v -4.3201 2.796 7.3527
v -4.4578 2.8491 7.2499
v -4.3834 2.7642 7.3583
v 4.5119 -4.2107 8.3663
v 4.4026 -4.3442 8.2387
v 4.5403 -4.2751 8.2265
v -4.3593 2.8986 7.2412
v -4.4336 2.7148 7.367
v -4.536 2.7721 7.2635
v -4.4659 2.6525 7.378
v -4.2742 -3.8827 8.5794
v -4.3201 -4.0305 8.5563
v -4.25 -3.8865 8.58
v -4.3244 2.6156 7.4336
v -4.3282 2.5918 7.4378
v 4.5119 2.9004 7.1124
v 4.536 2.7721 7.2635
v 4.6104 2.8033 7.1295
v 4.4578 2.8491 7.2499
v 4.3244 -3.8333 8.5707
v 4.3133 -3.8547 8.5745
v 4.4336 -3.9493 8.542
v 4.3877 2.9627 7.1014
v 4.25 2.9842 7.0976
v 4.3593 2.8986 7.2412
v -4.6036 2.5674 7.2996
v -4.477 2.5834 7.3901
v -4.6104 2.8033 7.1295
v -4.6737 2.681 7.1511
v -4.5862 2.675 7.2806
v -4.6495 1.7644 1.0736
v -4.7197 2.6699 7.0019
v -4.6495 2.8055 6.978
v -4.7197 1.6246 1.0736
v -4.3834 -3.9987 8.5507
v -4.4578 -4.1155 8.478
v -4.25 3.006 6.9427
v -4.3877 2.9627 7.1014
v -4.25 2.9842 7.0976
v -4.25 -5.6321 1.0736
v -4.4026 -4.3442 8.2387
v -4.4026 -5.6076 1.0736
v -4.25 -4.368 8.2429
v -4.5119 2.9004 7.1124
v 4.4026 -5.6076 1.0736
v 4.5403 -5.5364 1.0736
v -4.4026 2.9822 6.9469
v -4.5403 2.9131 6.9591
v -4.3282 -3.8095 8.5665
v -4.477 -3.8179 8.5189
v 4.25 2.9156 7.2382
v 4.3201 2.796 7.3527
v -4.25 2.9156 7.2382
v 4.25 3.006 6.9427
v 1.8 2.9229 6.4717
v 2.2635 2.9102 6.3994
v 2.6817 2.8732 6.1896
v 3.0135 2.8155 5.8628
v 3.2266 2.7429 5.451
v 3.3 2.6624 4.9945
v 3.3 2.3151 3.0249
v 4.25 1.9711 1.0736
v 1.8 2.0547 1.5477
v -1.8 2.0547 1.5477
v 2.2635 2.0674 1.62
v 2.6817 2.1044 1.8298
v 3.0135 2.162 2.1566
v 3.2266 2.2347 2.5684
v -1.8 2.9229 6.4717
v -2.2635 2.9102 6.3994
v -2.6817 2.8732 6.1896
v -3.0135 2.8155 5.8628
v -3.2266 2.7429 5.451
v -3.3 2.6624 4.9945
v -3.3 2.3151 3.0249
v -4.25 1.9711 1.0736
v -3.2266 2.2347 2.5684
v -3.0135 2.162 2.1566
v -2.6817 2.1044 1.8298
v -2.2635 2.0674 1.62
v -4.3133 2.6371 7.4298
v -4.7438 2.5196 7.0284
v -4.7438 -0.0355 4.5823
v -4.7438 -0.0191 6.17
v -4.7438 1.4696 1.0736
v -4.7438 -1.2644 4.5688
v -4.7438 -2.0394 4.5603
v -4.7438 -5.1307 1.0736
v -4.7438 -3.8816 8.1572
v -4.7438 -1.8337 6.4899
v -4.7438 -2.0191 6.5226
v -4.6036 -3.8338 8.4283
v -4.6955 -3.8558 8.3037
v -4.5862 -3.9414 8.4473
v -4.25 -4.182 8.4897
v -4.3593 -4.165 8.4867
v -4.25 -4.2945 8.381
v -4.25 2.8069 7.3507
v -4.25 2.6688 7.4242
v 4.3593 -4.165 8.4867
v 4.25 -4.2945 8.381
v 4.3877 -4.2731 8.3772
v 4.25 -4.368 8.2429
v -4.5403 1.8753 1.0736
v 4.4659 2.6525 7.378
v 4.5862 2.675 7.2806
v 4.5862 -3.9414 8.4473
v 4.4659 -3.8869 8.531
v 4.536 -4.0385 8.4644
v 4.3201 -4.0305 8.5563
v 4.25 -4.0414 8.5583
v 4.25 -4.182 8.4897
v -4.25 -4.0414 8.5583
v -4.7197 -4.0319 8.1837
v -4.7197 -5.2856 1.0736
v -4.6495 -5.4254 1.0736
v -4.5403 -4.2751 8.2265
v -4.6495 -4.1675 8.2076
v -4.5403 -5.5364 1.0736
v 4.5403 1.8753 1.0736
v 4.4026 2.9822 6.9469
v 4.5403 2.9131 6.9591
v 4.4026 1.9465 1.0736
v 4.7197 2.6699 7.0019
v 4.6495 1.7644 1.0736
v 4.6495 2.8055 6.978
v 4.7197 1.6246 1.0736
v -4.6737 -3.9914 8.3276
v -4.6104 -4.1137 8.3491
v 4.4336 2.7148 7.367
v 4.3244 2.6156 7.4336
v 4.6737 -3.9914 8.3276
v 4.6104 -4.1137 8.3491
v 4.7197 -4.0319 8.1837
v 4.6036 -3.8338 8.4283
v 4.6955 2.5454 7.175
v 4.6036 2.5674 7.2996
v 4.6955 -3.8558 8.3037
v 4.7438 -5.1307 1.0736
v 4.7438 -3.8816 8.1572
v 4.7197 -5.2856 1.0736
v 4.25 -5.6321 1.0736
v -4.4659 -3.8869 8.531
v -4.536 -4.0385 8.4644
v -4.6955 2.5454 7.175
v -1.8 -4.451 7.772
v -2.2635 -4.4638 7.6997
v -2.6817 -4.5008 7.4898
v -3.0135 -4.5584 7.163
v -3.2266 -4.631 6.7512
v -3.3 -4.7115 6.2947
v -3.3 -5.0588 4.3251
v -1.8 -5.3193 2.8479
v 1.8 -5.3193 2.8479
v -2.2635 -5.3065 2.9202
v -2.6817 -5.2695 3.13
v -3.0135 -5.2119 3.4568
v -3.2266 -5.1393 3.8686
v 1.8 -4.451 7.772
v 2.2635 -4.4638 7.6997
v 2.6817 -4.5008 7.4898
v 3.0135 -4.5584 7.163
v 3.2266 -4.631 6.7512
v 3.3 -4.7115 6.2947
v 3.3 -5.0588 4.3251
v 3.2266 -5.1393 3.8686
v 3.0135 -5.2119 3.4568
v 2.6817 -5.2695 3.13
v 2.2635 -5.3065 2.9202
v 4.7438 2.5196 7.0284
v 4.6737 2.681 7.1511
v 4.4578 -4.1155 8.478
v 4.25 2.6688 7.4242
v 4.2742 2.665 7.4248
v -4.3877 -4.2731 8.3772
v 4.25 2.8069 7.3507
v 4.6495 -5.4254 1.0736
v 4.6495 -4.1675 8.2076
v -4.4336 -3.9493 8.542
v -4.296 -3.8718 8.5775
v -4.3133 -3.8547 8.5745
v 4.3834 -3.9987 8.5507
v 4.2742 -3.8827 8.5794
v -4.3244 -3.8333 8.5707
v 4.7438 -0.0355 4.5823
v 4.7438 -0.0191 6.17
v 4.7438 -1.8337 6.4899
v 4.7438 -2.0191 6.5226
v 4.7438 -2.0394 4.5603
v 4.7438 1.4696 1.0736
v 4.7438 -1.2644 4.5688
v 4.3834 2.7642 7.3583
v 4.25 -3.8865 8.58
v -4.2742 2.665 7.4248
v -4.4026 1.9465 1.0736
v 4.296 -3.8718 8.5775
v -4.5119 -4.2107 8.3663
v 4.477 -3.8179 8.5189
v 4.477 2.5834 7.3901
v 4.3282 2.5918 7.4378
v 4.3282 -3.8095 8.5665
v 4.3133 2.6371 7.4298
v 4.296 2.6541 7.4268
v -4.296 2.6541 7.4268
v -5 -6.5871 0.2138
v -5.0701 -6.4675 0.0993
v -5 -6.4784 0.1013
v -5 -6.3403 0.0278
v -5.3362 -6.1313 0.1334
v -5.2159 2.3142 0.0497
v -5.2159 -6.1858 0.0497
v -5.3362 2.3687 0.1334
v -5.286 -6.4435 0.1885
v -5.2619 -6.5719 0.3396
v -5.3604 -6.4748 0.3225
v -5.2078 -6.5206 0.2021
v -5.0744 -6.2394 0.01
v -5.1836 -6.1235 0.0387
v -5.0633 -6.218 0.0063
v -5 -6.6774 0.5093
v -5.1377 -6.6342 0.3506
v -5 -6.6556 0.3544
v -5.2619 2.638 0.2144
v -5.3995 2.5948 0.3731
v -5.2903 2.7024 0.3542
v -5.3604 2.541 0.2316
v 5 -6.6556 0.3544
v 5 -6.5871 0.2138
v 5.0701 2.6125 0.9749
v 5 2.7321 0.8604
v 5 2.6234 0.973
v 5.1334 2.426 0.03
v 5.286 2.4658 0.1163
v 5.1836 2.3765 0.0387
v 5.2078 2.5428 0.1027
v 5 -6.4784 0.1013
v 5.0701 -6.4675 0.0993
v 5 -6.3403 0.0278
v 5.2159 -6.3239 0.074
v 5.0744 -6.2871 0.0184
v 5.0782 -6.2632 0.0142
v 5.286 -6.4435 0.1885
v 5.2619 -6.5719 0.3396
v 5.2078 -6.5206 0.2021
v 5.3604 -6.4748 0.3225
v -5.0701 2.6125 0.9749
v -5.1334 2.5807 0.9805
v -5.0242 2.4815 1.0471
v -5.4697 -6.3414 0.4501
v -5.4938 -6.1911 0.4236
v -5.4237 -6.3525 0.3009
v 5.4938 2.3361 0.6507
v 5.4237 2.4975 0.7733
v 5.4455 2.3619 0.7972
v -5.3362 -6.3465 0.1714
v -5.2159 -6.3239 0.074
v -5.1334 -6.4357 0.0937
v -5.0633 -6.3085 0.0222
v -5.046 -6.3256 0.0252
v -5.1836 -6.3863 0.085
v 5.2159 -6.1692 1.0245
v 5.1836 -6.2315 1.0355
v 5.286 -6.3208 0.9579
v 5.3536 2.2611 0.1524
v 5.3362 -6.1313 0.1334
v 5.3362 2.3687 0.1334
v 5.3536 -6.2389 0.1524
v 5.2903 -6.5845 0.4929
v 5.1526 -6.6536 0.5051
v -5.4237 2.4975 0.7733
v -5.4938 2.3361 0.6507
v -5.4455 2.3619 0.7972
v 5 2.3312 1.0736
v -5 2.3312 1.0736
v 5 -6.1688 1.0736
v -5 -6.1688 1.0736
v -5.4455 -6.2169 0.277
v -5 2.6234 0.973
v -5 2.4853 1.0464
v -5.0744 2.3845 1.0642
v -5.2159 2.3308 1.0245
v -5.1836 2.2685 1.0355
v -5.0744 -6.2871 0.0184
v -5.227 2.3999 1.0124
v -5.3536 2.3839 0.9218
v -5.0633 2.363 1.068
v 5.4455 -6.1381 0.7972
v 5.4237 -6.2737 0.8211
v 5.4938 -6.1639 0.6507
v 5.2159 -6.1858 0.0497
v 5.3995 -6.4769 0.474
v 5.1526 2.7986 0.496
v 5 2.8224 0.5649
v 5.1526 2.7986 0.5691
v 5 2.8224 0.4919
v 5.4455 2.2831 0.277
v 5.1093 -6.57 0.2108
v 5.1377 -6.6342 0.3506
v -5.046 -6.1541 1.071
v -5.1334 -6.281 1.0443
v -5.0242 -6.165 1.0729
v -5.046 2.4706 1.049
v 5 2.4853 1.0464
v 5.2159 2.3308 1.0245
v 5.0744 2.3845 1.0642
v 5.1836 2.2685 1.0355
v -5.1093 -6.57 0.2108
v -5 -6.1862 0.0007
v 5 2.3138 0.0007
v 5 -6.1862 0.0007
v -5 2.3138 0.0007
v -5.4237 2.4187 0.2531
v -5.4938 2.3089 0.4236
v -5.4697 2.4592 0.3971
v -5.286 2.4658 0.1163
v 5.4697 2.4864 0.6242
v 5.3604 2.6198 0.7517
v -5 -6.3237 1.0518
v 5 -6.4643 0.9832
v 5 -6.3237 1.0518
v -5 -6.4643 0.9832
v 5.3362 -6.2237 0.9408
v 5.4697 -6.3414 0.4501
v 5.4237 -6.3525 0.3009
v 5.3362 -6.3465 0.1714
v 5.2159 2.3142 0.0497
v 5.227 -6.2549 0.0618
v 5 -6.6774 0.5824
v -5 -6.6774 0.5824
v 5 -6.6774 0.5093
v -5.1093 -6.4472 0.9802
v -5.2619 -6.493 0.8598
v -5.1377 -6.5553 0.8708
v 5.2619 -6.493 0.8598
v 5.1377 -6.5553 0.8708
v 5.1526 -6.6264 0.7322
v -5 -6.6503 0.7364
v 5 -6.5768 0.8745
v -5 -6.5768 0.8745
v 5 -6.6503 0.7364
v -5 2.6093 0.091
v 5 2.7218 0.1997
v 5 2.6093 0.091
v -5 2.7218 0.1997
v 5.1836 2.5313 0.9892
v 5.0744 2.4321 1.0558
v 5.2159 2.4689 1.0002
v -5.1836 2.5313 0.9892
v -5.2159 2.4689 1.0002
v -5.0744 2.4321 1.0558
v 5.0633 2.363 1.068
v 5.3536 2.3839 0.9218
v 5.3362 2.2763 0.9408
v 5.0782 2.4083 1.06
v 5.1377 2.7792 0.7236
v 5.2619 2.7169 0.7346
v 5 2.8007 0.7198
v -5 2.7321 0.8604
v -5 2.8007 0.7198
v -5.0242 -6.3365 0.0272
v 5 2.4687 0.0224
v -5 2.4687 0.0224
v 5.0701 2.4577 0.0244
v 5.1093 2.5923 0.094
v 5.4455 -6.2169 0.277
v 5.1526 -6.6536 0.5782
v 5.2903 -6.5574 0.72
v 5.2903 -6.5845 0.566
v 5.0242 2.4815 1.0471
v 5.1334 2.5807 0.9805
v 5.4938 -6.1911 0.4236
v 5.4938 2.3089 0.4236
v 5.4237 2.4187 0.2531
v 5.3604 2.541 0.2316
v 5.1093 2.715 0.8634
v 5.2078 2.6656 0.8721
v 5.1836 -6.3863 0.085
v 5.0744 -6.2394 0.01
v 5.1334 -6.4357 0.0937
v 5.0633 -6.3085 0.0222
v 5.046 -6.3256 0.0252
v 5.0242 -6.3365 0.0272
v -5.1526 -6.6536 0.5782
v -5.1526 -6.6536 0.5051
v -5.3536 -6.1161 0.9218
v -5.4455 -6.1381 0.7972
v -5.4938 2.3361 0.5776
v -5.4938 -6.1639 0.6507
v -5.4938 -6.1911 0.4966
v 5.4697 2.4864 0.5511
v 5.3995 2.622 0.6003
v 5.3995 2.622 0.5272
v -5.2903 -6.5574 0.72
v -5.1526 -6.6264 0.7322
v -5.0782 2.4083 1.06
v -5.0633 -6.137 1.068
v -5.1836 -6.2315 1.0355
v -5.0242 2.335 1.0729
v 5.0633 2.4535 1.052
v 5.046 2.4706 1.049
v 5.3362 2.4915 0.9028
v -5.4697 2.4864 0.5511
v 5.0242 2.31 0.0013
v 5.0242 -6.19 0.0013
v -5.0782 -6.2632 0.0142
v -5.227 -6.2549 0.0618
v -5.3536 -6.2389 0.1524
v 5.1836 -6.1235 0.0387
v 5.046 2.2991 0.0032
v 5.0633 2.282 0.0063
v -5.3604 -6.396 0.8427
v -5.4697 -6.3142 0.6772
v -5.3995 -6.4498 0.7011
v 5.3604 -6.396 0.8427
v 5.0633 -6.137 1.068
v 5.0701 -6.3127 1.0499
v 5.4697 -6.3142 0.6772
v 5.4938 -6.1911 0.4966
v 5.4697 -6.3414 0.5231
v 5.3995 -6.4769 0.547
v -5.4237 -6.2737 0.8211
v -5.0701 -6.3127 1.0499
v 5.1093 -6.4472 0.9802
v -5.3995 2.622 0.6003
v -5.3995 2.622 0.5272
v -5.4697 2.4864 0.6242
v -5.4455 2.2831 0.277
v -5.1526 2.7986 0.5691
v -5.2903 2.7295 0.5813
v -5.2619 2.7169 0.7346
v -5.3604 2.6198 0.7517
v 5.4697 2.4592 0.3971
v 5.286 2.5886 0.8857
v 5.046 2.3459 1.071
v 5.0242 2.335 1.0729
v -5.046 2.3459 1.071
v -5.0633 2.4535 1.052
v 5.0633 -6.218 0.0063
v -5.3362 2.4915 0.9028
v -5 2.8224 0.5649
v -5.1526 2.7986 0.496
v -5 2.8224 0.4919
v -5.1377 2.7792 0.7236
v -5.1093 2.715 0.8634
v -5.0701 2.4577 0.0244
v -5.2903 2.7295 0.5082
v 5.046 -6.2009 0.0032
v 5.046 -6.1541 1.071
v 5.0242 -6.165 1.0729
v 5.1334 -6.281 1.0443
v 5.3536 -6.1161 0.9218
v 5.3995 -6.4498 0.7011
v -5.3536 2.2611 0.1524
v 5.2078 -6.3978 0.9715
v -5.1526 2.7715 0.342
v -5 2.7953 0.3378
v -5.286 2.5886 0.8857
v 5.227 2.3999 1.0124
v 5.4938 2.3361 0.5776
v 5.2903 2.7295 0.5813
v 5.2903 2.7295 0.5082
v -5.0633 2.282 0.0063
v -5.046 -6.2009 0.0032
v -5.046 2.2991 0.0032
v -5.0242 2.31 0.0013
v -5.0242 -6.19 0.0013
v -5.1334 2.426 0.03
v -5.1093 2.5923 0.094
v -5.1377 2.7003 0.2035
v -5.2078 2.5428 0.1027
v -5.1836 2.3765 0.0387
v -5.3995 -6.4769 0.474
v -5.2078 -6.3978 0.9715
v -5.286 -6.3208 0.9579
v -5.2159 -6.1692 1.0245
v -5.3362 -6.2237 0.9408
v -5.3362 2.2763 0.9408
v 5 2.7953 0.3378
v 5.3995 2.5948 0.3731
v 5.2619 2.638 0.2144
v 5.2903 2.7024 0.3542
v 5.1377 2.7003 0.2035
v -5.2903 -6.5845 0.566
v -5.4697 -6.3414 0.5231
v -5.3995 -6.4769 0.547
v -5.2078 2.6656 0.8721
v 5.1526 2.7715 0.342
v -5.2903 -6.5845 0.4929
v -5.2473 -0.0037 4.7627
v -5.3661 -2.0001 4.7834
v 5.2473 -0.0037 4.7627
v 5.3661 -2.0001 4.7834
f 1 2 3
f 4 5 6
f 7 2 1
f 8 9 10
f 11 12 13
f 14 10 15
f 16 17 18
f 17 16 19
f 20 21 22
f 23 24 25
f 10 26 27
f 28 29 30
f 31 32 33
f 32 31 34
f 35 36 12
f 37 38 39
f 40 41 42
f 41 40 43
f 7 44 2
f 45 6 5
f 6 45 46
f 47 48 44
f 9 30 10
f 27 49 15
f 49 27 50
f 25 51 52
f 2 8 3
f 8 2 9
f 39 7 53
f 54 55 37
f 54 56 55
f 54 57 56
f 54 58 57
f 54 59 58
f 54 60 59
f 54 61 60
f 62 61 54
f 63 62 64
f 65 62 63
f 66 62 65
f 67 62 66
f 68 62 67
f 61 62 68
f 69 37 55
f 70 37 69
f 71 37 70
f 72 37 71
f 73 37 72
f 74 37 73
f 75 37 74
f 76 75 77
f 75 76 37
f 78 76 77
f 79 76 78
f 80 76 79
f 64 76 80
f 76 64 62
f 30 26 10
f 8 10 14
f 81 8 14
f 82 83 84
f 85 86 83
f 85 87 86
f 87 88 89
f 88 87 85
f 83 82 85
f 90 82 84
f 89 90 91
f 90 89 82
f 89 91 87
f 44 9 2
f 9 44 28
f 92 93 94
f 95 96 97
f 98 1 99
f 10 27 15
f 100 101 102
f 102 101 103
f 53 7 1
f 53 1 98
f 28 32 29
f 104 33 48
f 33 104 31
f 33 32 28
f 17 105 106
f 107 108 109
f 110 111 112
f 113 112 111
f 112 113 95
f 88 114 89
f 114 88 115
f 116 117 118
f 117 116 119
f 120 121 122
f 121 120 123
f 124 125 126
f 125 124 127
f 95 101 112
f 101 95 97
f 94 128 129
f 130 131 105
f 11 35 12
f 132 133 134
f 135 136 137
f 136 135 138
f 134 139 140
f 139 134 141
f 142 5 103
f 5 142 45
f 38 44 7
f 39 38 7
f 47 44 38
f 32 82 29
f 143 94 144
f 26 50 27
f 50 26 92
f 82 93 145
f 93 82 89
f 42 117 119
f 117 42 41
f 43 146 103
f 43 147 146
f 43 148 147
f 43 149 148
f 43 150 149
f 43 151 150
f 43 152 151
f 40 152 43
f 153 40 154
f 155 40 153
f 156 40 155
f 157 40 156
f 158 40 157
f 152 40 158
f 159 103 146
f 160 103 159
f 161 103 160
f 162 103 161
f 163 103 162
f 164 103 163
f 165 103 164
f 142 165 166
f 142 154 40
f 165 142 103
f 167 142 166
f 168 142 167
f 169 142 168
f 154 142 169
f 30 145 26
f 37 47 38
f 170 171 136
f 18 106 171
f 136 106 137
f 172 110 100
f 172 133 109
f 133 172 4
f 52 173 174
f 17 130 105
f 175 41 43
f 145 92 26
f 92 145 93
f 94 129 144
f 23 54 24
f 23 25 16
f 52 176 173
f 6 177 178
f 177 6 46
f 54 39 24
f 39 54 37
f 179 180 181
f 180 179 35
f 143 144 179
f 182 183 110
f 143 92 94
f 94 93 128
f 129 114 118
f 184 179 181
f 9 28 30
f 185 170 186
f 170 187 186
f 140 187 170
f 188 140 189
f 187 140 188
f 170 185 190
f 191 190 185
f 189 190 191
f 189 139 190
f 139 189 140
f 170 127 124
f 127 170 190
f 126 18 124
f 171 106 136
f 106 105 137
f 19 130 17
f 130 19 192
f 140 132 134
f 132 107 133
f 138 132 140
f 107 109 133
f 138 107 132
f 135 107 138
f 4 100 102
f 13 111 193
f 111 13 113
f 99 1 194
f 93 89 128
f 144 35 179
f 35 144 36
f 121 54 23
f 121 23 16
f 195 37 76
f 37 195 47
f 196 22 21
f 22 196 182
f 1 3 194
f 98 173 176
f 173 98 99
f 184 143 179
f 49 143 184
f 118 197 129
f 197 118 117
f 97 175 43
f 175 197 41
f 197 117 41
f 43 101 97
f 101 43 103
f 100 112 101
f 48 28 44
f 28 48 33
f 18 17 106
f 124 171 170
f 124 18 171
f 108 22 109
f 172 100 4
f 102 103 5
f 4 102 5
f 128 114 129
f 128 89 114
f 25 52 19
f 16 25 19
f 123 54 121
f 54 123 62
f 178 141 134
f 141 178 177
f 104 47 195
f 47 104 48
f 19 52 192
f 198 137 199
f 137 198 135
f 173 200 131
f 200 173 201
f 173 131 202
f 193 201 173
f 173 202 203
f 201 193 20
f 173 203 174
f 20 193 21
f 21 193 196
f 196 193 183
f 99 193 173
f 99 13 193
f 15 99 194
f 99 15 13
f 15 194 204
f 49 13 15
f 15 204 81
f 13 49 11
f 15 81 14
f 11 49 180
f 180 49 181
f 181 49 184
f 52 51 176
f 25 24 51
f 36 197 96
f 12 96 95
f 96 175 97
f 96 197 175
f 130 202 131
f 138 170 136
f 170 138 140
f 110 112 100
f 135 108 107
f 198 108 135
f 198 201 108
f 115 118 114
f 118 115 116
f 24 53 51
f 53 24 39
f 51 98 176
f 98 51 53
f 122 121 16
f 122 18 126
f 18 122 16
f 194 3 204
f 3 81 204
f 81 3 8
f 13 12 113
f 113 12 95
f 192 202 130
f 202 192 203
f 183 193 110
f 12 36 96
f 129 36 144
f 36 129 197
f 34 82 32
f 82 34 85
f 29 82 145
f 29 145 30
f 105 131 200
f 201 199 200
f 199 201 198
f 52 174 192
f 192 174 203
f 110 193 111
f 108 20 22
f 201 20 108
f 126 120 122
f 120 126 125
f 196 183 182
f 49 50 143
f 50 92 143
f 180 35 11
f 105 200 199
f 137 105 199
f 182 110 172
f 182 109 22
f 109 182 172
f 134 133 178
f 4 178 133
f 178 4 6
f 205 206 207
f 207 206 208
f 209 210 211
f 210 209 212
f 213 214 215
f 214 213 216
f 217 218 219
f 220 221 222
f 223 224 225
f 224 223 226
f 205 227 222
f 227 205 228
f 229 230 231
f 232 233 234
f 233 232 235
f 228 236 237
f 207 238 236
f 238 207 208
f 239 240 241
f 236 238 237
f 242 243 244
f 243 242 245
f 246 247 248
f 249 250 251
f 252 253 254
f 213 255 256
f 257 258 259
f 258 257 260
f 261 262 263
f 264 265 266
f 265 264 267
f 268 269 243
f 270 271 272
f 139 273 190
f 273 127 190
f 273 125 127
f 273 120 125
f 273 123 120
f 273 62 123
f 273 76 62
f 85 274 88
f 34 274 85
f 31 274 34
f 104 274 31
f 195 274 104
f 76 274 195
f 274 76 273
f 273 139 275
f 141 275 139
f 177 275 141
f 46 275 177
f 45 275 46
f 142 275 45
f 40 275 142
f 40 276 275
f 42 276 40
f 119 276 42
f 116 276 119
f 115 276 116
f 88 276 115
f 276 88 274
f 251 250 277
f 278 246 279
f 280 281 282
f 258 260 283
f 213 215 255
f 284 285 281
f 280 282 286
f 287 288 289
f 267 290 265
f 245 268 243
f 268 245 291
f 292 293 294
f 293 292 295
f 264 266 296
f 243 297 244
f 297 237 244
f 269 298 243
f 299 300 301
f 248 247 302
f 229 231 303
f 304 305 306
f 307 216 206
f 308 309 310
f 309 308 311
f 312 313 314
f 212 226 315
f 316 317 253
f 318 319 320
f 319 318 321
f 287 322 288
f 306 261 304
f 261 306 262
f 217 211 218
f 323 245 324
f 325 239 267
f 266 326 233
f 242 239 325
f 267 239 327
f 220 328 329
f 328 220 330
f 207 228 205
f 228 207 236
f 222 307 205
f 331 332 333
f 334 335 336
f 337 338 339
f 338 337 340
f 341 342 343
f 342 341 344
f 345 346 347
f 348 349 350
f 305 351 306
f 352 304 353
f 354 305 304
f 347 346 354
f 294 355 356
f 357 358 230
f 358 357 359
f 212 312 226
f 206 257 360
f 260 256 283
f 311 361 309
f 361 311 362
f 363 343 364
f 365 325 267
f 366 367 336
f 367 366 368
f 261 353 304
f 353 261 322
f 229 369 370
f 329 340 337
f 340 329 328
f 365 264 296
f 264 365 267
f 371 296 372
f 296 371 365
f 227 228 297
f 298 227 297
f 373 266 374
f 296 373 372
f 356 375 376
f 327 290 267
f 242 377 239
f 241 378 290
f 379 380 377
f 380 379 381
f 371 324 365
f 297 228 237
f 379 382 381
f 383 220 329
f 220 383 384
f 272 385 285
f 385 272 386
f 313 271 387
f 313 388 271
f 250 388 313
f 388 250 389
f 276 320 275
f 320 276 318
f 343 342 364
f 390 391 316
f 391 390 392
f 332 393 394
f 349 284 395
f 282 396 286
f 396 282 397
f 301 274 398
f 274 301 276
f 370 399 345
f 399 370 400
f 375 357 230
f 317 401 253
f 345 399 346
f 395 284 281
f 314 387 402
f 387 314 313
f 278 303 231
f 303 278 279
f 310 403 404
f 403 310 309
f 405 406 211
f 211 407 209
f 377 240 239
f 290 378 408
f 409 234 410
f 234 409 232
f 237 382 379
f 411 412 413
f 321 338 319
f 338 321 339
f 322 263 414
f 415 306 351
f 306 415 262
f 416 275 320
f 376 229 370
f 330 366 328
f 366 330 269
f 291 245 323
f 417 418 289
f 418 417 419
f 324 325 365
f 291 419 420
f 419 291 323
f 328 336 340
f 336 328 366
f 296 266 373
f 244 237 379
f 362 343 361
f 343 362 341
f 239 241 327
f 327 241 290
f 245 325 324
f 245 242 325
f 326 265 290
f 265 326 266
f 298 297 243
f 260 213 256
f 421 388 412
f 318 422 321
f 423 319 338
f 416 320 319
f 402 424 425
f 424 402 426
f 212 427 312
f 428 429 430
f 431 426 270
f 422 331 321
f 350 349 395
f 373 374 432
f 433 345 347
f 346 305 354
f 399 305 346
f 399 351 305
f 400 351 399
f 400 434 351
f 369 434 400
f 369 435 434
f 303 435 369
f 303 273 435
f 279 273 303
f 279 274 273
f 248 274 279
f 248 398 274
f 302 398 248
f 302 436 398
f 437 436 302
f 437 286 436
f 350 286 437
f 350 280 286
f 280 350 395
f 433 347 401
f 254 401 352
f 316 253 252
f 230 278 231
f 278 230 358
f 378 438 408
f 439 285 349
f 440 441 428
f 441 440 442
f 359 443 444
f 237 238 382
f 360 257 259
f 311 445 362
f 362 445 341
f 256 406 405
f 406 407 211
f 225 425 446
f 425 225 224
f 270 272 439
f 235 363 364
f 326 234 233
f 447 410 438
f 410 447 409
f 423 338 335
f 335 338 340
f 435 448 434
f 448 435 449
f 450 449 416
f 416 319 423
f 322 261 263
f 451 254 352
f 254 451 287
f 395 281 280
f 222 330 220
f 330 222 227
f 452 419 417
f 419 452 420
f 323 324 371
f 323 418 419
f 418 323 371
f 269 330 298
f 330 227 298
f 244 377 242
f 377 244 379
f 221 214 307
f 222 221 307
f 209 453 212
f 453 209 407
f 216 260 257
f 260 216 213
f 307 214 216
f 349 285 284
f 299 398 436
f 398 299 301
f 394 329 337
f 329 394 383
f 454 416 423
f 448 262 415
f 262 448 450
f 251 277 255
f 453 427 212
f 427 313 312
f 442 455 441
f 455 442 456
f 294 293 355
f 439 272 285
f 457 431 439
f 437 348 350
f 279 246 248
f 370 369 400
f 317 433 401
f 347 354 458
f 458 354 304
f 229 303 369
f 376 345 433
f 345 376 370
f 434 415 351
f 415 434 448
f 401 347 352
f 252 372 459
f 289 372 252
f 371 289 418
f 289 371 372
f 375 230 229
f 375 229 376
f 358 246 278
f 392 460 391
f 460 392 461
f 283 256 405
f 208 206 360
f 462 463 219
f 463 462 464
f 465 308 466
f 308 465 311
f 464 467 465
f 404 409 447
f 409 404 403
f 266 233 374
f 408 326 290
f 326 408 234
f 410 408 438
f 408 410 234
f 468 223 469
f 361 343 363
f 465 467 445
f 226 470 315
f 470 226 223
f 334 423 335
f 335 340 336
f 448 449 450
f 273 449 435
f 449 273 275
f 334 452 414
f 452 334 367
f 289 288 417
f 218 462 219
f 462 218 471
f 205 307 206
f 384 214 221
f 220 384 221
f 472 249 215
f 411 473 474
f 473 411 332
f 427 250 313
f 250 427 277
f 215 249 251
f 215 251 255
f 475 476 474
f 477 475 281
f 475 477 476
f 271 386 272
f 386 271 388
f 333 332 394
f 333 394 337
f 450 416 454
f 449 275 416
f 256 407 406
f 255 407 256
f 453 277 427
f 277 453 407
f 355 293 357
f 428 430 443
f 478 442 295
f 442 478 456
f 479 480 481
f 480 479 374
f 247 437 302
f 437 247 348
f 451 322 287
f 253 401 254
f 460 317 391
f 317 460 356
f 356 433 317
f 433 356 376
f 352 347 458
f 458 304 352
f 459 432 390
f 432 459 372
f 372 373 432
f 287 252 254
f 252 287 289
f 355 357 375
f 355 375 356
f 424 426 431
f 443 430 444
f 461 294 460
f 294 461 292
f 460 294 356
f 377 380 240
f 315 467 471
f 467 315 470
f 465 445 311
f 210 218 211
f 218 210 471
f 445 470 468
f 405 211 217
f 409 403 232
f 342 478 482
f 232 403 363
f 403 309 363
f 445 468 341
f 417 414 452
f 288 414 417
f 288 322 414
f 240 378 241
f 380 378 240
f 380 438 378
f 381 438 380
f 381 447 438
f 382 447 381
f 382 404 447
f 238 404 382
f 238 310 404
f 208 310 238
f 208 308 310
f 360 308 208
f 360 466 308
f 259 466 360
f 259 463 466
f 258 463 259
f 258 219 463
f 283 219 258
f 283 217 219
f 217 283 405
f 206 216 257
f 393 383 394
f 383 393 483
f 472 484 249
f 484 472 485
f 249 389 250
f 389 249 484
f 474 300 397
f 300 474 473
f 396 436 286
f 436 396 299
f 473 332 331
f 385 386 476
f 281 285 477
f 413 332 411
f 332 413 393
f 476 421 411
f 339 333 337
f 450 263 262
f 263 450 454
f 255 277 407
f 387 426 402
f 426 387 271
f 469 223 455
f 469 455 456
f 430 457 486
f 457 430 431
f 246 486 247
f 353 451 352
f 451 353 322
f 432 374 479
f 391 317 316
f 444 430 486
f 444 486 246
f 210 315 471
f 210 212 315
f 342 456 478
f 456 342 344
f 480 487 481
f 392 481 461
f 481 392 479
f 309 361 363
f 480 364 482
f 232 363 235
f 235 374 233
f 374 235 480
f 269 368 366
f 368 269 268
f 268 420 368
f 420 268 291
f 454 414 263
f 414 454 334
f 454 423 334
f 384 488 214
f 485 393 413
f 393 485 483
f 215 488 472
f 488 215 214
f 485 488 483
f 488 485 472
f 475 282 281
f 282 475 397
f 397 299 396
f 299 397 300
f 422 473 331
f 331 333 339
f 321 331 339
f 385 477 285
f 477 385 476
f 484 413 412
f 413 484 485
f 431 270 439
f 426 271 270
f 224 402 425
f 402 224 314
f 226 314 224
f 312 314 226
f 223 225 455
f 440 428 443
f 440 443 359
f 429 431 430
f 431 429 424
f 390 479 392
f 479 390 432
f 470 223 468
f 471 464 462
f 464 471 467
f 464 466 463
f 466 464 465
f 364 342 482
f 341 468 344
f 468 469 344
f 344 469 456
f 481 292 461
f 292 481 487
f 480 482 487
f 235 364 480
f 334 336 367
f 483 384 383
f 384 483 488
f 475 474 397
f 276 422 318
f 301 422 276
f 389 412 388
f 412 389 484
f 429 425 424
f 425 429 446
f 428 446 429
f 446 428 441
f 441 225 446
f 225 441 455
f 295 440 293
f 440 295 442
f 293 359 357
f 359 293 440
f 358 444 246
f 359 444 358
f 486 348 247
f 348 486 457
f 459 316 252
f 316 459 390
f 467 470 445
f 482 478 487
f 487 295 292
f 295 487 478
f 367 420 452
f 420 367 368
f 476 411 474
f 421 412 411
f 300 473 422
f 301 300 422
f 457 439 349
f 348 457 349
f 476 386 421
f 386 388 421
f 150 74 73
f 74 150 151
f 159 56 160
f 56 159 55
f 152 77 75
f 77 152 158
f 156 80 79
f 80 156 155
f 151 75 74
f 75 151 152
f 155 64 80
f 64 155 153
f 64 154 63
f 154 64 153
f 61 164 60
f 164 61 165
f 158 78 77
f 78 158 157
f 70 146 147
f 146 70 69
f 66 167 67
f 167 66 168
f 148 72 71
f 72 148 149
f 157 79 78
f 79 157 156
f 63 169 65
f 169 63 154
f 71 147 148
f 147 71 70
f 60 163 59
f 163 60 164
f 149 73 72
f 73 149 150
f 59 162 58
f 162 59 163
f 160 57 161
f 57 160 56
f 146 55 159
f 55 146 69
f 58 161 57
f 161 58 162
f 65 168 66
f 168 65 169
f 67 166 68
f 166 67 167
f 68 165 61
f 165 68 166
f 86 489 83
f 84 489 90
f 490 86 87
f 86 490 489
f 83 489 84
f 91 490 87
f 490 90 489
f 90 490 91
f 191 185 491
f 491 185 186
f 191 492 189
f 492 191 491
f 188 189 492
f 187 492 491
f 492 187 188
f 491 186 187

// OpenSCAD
// ORIC Reset (NMI) button
//
// Copyright François Revol, 2025
// Licenced under CC-BY-SA

$fa = 0.1;
$fn = 20;


ORIC_case_bottom_angle = 10;
b1_bbox = [214, 145.5, 33];

variant = 1; // [0:clip-on button,1:clip-in case]

print_orientation = 1; // [0:normal,1:upside-down]

// 9.6x7.7

module ORIC_case_bottom() {
    difference() {
        union() {
            rotate([ORIC_case_bottom_angle,0,0]) difference() {
                cube(b1_bbox);
                translate(2*[1,1,-1]) cube(b1_bbox - 4*[1,1,0]);
            }
            translate([140,90,33+10]) cylinder(d=64.8, h=2);
        }
        translate([140,90,33+10+2]) {
            cylinder(d=64.8, h=11);
            for (dx = [-1, 1], dy = [0:5])
                translate([dx*(3+14.8)/2, (dy-2.5)*(3+2.95), 0]) cube([14.8, 2.8, 10], center=true);
            //#cube([32.8,32.8,10], center=true);
        }
    }
}


module ORIC_NMI_switch() {
    color("white", 0.4) translate([0,0,11.3/2]) cube([11.8, 9.8, 11.3], center=true);
    color("black") translate([0,0,11.3-6/2+1.1]) {
        cube([9.9, 7.8, 6], center=true);
        translate([0,0,(6+4)/2]) cube([6.6, 6, 4], center=true);
        translate([0,0,(6+4+1)/2]) cube([8, 6, 3], center=true);
    }
}

// too complex, and requires opening the machine
module ORIC_NMI_button_v1() {
    radius = 1;
    color("green", 0.4) {
        difference() {
            translate([0,0,5/2]) cube([9.8+1/*11.8-2.8+1*/, 7.9+1/*9.8-1.8*/, 5], center=true);
            //translate([0,0,3]) linear_extrude(4, scale=[0.5,0.5]) square([8,6], center=true);
            translate([0,0,-1]) linear_extrude(5, scale=[0.2,1]) square([6,10], center=true);
            translate([0,0,-1]) linear_extrude(4, scale=[0.1,0.3]) square([11,8.5], center=true);
            if ($preview) cube(8); // DEBUG
            translate([0,0,(4.4)/2]) cube([7.7, 6.4, 4.4], center=true);
            translate([0,0,(4.4+1)/2]) cube([8.3, 6.4, 3.4], center=true);
            for (dy=[-1,1])
                translate([0,dy*2.8,0]) cube([15,0.8,7], center=true);
        }
        translate([0,0,5])
            linear_extrude(3, scale = 0.5) square([9.7+1,7.9+1], center=true);
        translate([0,0,6+20/2]) {
            minkowski() {
                intersection() {
                    cube([9-2-2*radius, 8-2.5-2*radius, 20], center=true);
                translate([-140-66,-90-15,-33-12-11.5-1]) rotate([ORIC_case_bottom_angle,0,0]) cube(b1_bbox);
                }
                sphere(r=radius);
            }
        }
    }
    //translate([10,0,4]) color("blue", 0.5) cube([4,4,8.5]);
}

module ORIC_NMI_button_v2() {
    radius = 0.5;
    color("blue", 0.4) {
        translate([0,0,4.5+10/2]) {
            difference() {
                minkowski() {
                    intersection() {
                        union() {
                            cube([9.7-0.2-2*radius, 7.7-0.2-2*radius, 10+2*radius], center=true);
                            translate([0,0,1.6]) rotate([ORIC_case_bottom_angle,0,0]) cube([10, 8.5, 0.1], center=true);
                        }
                    translate([-140-66,-90-15,-33-12-6.5+1.6-radius]) rotate([ORIC_case_bottom_angle,0,0]) cube(b1_bbox);
                    }
                    sphere(r=radius);
                }
                hull() for(dx=[-1,1], dz=[-1,1]) {
                    translate([dx*1.8,0,dz-2.6]) rotate([90,0,0]) cylinder(d=3, h=10, center=true);
                }
            }
            // there the case is
            //#translate([0,0,-1]) rotate([ORIC_case_bottom_angle,0,0]) cube([9, 8, 3], center=true);
            /*for (dx=[-1,1])
                translate([dx*4.6,0,-3.2]) sphere(d=1.5);*/
            for (dx=[-1,1])
                translate([dx*4.5,0,-3.5]) rotate([10,dx*20,0]) cube([1,2,2], center=true);
        }
    }
}

if ($preview)  {
    //translate([-140,-90,-33-12]) color("red", 0.6) ORIC_case_bottom();
    translate([0,0,0]) ORIC_NMI_switch();
}


if (variant == 1) {
    print_translate = print_orientation ? [0,0,11.95-0.495] : [0,0,-3.5];
    print_rotate = print_orientation ? [180-ORIC_case_bottom_angle,0,0] : [0,0,0];
    translate($preview ? [0,0,12.5] : print_translate)
        rotate($preview ? [0,0,0] : print_rotate)
            ORIC_NMI_button_v2();
} else {
    print_translate = print_orientation ? [0,0,11.85] : [0,0,0];
    print_rotate = print_orientation ? [180-ORIC_case_bottom_angle,0,0] : [0,0,0];
    translate($preview ? [0,0,12.5] : print_translate)
        rotate($preview ? [0,0,0] : print_rotate)
            ORIC_NMI_button_v1();
}
